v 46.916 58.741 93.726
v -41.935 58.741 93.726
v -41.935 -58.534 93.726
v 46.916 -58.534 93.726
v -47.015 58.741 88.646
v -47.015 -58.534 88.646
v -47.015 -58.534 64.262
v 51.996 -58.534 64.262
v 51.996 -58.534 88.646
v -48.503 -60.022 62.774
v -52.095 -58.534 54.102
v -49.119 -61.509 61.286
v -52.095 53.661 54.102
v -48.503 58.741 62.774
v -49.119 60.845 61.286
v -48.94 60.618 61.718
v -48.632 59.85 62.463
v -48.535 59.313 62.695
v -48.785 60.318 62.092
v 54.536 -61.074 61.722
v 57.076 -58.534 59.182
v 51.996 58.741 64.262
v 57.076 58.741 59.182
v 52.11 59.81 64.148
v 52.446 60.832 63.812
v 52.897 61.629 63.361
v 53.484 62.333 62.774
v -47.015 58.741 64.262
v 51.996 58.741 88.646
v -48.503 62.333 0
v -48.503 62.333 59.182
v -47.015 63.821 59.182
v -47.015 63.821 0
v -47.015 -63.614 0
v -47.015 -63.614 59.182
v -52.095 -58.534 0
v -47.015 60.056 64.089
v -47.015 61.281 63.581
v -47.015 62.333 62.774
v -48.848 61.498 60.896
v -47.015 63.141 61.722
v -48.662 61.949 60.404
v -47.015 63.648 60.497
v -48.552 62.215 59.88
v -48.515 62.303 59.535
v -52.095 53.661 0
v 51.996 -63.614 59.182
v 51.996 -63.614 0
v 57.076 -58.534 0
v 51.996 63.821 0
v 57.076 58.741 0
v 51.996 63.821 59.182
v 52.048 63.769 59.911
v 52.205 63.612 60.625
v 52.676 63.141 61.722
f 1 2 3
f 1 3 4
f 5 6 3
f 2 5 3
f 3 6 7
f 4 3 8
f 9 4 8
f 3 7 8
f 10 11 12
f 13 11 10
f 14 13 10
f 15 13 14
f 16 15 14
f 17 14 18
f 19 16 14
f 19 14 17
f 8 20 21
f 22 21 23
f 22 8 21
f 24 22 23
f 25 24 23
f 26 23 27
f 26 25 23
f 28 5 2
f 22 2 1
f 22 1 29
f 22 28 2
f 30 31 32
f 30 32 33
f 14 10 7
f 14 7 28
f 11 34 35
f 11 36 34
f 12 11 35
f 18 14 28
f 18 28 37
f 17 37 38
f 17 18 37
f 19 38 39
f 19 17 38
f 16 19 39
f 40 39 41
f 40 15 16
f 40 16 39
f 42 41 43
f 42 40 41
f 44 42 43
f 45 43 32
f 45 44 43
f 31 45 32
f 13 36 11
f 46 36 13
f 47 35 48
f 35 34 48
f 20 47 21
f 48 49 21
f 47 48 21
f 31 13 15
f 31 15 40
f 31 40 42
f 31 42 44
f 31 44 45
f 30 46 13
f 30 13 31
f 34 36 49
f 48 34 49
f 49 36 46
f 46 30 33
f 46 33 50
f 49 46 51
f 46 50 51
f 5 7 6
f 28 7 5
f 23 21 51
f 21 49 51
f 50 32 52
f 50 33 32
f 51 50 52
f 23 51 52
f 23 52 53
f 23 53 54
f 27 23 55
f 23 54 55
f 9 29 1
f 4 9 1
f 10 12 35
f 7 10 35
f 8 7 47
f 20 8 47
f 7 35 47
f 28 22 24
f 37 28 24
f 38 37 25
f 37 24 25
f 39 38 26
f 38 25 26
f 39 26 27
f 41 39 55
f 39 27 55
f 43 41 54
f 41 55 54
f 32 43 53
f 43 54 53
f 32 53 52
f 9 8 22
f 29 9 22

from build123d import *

# Parameters (mm, degrees)
F0_W         = 109.1705858707
F0_H         = 127.4348646402
F1_DEPTH     = 64.262
F2_SIZE      = 5.08
F3_R         = 5.08
F4_SIZE      = 5.08
F5_SIZE      = 5.08
F6_T1_DEPTH  = 85.5235311919
F7_SIZE      = 5.08
F8_SIZE      = 5.08
F9_SIZE      = 5.08
F10_DEPTH    = 29.464
F11_T1_DEPTH = 138.5363958322
F11_T3_DEPTH = 143.403163798


# Not quite as in the source:
# - a fillet or chamfer that OpenCascade refuses, or shapes differently, is made with other operations: its cross-section is extruded or revolved along the edge and cut away or added
# - two fillets or chamfers of one size are made in one step


with BuildPart() as f1:
    # F0 (on Top) → F1 (new body)
    with BuildSketch(Plane.XY):
        with Locations((2.4905838072, 0.1037716866)):
            Rectangle(F0_W, F0_H)
    extrude(amount=F1_DEPTH)

    # F2
    f2_edges = [f1.edges().sort_by_distance(p)[0] for p in [
        (57.075877, 0.103772, 64.262),
    ]]
    chamfer(f2_edges, length=F2_SIZE)

    # F3
    f3_edges = [f1.edges().sort_by_distance(p)[0] for p in [
        (-0.049416, 63.821204, 64.262),
    ]]
    fillet(f3_edges, radius=F3_R)

    # F4
    f4_edges = [f1.edges().sort_by_distance(p)[0] for p in [
        (-0.049416, -63.613661, 64.262),
    ]]
    chamfer(f4_edges, length=F4_SIZE)

    # F5
    f5_edges = [f1.edges().sort_by_distance(p)[0] for p in [
        (-52.094709, 0.103772, 64.262),
    ]]
    chamfer(f5_edges, length=F5_SIZE)

    # F6: chamfer of 5.08 on 1 edges, made by hand

    # F6_s2 → F6_t1 (cut)
    with BuildSketch(Plane.XY.offset(-13.170765596)):
        Polygon((-52.0947091281, 53.6612040067), (-48.5026066797, 62.3333064551), (-52.0947091281, 58.7412040067), align=None)
    extrude(amount=F6_T1_DEPTH, mode=Mode.SUBTRACT)

    # F7
    f7_edges = [f1.edges().sort_by_distance(p)[0] for p in [
        (-52.094709, -63.613661, 29.591),
    ]]
    chamfer(f7_edges, length=F7_SIZE)

    # F8
    f8_edges = [f1.edges().sort_by_distance(p)[0] for p in [
        (57.075877, -63.613661, 29.591),
    ]]
    chamfer(f8_edges, length=F8_SIZE)

    # F9
    f9_edges = [f1.edges().sort_by_distance(p)[0] for p in [
        (57.075877, 63.821204, 29.591),
    ]]
    chamfer(f9_edges, length=F9_SIZE)

    # F10 (add): a face of the model
    f10_faces = [f1.faces().sort_by_distance(p)[0] for p in [
        (2.4905838072, 0.1037716866, 64.262),
    ]]
    extrude(f10_faces, amount=F10_DEPTH)

    # F11: chamfer of 5.08 on 3 edges, made by hand

    # F11_s2 → F11_t1 (cut)
    with BuildSketch(Plane.XZ.offset(-66.8319696027)):
        Polygon((-52.0947091281, 54.102), (-48.5026066797, 62.7741024484), (-52.0947091281, 59.182), align=None)
    extrude(amount=F11_T1_DEPTH, mode=Mode.SUBTRACT)

    # F11_s4 → F11_t3 (cut)
    with BuildSketch(Plane.XZ.offset(-71.8053535855)):
        Polygon((51.9958767426, 88.646), (46.9158767426, 93.726), (51.9958767426, 93.726), align=None)
        Polygon((-47.0147091281, 88.646), (-41.9347091281, 93.726), (-47.0147091281, 93.726), align=None)
    extrude(amount=F11_T3_DEPTH, mode=Mode.SUBTRACT)


solid = f1.part
